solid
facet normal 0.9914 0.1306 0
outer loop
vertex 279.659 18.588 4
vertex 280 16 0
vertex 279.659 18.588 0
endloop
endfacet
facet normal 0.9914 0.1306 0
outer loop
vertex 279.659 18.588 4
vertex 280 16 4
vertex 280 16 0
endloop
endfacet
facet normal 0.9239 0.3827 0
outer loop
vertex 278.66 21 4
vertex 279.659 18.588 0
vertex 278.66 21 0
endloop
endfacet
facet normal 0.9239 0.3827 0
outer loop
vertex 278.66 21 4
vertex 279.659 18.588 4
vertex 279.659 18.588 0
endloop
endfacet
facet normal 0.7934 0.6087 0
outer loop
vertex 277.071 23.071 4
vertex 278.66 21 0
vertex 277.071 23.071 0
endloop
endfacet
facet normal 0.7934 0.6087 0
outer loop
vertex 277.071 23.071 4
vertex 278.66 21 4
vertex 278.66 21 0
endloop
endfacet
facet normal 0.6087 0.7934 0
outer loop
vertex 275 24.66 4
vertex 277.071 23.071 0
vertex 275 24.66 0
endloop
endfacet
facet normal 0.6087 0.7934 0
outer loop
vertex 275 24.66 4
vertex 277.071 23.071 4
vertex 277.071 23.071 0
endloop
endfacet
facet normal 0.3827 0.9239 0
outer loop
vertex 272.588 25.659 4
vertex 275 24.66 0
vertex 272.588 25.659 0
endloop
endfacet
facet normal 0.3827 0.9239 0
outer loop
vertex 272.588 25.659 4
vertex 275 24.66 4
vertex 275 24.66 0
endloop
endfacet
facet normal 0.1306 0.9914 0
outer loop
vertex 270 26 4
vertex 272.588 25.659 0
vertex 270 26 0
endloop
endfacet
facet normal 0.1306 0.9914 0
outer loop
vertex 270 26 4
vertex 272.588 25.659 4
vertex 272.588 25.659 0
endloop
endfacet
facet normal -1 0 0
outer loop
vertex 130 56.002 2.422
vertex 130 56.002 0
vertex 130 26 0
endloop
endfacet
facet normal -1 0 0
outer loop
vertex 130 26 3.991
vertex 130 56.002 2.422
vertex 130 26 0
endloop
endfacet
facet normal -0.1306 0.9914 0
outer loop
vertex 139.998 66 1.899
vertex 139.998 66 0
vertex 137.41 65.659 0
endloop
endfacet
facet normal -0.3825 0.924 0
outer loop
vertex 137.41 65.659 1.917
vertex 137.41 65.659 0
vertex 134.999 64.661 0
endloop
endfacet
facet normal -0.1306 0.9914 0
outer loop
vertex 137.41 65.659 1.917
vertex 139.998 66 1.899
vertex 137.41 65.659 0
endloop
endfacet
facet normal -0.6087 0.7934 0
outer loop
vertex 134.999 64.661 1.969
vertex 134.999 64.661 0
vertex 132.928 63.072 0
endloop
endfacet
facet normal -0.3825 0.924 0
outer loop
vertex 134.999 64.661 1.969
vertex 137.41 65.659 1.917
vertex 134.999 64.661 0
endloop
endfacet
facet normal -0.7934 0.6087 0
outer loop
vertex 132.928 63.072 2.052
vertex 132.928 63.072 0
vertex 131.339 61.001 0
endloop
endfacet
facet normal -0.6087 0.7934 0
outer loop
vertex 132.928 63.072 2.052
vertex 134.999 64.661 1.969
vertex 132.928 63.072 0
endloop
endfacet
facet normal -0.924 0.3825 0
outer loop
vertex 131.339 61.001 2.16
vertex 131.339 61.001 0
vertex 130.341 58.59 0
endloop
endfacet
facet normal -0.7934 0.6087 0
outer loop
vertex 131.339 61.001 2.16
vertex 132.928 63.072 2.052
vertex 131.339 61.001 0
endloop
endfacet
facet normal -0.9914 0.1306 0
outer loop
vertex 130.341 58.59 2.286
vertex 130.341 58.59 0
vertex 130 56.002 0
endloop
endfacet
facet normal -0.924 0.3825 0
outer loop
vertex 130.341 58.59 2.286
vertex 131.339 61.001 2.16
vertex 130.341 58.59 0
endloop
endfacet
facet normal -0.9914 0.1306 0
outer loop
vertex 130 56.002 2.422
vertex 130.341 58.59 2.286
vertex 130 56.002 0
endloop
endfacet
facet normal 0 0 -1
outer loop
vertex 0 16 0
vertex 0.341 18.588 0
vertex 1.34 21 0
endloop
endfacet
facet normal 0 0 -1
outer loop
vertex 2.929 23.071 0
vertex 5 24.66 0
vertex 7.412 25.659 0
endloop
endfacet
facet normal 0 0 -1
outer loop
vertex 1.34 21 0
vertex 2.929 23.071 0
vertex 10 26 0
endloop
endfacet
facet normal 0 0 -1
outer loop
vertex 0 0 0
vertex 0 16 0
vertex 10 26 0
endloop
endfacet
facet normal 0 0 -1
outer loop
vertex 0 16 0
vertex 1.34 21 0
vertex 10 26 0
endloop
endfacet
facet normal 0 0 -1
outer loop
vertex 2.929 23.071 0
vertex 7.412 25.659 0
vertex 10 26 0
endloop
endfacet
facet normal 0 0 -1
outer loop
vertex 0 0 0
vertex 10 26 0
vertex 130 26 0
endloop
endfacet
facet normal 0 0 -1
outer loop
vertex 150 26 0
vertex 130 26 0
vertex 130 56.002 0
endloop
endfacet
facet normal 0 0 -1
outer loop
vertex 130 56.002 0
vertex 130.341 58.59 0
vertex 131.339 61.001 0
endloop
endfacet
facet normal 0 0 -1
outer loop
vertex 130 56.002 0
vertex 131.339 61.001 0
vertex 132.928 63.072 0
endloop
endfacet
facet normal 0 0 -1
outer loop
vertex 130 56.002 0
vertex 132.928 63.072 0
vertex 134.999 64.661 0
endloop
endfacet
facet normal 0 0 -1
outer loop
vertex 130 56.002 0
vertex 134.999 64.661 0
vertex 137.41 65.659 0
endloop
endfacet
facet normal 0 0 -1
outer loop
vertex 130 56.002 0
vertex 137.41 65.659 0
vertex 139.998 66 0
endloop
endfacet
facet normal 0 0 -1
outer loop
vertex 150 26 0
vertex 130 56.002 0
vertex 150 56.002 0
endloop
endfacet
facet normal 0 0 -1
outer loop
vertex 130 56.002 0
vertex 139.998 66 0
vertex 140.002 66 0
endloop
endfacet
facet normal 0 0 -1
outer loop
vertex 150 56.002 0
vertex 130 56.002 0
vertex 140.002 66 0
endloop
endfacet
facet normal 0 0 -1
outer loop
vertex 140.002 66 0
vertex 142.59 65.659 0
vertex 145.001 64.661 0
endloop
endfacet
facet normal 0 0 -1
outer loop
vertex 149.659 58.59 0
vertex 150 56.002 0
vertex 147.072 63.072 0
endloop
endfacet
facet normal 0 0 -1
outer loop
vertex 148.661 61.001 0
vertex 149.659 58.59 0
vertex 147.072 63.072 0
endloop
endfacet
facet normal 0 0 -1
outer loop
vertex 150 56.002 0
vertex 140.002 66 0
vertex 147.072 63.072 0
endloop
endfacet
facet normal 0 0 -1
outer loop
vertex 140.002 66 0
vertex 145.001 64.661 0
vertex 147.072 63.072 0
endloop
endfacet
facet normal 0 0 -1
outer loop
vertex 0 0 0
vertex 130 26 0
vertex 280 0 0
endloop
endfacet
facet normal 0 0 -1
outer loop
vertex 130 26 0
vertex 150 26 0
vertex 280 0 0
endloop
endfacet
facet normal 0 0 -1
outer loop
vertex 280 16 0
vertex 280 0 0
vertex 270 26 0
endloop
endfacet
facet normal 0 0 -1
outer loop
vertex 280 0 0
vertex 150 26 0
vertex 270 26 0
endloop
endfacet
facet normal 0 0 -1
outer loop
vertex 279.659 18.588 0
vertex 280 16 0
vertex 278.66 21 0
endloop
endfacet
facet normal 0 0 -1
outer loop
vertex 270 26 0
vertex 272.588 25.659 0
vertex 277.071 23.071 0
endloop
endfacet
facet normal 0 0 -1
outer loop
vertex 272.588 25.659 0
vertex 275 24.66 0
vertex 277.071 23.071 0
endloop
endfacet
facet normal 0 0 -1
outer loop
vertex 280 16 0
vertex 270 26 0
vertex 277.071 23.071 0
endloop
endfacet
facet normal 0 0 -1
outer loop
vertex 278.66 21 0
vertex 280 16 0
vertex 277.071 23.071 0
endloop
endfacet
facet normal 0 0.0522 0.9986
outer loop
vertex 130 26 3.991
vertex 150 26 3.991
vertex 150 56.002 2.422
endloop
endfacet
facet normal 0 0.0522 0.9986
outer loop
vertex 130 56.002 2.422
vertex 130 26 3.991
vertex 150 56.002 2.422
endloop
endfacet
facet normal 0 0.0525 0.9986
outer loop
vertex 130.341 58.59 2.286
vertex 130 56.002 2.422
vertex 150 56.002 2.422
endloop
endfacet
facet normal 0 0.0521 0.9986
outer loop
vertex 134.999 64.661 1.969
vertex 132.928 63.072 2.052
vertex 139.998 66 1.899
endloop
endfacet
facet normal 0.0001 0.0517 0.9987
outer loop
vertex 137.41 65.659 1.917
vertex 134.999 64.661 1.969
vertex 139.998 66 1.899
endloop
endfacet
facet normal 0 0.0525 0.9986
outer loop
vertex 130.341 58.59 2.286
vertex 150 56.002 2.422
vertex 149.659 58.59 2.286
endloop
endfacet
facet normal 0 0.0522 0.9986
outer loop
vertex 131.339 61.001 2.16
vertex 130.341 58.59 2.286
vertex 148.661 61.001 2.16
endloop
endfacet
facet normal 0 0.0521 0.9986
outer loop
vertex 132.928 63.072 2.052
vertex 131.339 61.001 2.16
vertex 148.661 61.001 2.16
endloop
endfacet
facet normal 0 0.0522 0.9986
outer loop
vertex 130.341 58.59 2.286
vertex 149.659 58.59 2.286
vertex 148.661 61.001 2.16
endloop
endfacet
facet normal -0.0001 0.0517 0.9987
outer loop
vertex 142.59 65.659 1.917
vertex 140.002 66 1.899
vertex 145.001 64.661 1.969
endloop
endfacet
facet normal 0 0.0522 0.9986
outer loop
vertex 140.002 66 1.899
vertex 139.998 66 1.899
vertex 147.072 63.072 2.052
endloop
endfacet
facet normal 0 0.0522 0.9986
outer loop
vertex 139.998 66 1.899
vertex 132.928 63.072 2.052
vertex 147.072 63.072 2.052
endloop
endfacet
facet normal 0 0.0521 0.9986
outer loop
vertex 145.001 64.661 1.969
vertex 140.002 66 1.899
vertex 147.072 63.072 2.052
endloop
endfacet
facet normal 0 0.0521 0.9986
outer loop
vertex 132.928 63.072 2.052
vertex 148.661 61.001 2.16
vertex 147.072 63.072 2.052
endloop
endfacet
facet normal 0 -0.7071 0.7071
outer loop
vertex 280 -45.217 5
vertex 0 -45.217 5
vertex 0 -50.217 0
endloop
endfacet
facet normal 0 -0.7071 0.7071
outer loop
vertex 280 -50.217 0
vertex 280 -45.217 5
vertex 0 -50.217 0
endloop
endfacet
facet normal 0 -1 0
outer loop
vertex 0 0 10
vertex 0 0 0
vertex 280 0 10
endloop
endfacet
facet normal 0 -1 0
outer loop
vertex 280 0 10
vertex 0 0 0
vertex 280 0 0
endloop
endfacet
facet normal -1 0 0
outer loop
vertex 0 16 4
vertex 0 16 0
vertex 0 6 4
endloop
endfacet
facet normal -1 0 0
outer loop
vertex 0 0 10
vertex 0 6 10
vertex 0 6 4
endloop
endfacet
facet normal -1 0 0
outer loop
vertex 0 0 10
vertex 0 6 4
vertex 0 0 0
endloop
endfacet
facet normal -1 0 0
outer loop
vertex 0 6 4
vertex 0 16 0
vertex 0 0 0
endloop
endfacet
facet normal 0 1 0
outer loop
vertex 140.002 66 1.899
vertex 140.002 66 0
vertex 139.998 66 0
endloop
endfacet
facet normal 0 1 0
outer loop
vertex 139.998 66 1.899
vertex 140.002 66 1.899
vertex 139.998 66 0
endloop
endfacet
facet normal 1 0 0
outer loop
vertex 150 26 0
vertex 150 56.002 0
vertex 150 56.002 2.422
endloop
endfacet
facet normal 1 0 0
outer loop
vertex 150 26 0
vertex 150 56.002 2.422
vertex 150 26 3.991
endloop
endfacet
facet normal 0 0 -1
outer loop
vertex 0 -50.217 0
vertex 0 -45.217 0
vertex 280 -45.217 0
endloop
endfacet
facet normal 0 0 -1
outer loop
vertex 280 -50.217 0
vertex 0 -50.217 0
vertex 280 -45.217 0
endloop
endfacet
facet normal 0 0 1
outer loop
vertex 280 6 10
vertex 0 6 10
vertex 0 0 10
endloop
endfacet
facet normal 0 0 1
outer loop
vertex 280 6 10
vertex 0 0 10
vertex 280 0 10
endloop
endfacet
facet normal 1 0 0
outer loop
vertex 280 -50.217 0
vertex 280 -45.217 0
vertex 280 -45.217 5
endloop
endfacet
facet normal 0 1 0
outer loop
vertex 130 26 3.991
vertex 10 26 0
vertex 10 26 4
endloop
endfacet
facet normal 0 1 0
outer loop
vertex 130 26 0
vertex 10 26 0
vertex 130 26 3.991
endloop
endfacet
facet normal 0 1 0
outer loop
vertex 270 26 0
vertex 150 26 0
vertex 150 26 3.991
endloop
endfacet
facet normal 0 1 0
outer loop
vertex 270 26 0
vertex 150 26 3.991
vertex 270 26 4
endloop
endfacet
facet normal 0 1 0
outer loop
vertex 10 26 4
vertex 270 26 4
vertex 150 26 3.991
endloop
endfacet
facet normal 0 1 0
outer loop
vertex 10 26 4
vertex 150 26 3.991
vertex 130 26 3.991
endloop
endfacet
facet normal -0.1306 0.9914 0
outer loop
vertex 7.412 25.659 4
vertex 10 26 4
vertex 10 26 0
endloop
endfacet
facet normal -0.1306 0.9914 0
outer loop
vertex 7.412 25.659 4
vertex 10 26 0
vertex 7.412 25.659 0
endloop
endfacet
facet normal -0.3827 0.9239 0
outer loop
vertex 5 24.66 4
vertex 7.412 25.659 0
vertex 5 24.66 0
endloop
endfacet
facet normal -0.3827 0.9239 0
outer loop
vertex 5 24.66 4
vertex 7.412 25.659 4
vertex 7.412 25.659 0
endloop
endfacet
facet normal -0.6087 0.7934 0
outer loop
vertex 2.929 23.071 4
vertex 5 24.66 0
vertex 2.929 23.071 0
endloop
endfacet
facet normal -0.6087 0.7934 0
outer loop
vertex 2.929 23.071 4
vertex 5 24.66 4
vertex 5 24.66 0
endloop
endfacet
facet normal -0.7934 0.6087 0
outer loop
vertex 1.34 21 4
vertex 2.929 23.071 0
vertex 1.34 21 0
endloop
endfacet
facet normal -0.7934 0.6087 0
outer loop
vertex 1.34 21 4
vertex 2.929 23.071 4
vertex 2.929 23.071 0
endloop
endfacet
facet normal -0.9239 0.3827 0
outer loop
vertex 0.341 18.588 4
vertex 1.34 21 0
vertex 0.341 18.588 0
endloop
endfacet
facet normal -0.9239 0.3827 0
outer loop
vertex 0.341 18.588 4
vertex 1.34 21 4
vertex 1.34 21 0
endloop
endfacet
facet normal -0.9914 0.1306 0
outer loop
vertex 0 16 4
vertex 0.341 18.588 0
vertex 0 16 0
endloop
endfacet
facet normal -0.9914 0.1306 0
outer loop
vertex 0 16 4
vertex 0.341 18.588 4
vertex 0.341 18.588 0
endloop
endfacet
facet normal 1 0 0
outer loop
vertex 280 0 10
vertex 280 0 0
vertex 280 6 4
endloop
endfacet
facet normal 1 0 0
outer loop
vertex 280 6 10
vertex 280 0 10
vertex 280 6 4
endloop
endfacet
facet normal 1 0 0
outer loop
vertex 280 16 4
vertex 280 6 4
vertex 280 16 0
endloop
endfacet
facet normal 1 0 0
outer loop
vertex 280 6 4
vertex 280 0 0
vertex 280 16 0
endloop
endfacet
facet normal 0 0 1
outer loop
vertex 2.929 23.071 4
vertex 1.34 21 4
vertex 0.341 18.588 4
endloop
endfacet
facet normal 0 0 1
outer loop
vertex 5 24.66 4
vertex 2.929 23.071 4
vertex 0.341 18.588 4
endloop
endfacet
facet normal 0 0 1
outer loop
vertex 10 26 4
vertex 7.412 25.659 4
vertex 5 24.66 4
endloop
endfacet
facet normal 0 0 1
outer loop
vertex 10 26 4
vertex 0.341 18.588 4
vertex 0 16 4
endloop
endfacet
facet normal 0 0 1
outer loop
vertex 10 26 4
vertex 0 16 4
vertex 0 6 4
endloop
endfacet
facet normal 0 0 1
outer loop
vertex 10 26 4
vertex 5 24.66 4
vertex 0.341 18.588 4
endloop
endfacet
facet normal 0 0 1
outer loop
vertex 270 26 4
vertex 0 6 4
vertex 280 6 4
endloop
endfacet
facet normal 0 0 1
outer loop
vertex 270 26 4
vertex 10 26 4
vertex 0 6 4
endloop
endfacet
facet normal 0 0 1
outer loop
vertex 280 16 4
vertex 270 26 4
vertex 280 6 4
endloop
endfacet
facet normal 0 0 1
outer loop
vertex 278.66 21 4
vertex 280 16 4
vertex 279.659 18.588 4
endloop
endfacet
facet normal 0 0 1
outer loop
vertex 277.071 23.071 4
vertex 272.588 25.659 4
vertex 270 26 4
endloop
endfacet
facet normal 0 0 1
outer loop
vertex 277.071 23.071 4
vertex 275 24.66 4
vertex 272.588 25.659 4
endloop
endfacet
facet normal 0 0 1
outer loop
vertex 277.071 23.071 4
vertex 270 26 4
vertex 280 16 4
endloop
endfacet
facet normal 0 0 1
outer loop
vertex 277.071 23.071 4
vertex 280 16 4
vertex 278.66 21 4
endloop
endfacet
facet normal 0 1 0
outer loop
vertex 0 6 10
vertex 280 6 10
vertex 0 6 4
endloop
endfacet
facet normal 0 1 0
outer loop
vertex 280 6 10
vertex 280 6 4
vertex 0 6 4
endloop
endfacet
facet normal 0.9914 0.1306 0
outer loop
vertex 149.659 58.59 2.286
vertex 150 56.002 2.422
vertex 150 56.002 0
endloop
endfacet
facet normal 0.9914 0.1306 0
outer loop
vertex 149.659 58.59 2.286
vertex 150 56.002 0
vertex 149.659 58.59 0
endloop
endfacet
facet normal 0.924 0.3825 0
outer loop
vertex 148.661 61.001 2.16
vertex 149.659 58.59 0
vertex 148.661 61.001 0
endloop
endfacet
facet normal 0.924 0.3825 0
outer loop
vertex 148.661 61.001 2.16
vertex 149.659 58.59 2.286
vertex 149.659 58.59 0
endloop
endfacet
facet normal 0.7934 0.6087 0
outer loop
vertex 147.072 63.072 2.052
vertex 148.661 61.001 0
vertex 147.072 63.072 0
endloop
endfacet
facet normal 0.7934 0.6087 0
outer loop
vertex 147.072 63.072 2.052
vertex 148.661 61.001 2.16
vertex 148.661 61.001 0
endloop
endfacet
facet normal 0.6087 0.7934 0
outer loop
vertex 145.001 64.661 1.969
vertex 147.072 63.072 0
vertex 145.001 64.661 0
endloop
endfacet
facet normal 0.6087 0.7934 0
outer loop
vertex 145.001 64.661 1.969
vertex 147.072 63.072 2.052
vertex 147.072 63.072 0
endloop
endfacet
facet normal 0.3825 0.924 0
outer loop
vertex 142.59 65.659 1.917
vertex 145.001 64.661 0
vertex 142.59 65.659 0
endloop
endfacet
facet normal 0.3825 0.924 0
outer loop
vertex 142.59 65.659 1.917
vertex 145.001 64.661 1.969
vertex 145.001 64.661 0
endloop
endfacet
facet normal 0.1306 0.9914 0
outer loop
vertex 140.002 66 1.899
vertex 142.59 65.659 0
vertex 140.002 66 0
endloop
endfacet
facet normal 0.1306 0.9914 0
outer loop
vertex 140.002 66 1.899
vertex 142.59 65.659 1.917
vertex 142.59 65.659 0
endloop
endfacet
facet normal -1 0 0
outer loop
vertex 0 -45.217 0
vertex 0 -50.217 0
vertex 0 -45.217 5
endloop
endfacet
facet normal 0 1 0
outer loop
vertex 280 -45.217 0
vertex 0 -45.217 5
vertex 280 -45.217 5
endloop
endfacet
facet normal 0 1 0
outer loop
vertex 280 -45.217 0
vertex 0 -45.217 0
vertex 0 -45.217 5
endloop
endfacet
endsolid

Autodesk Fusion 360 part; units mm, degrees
sketch "Sketch1" plane through (0, 0, 0) normal (0, 0, 1) x (1, 0, 0)
  line L0 (0, 0) -> (280, 0)
  line L1 (280, 0) -> (280, 6)
  line L2 (280, 6) -> (0, 6)
  line L3 (0, 6) -> (0, 0)
  line L4 (280, 6) -> (0, 6)
  line L5 (0, 6) -> (0, 26)
  line L6 (0, 26) -> (280, 26)
  line L7 (280, 26) -> (280, 6)
  line L8 (140, 26) -> (140, 66) construction
  line L9 (140, 66) -> (150, 66)
  line L10 (150, 66) -> (150, 26)
  line L11 (150, 26) -> (140, 26)
  line L12 (140, 26) -> (140, 66)
  line L13 (140, 66) -> (130, 66)
  line L14 (130, 66) -> (130, 26)
  line L15 (130, 26) -> (140, 26)
  line L16 (140, 26) -> (140, 66)
  dimension "d1" = 280
  dimension "d2" = 6
  dimension "d9" = 20
  dimension "d10" = 280
  dimension "d11" = 40
  dimension "d12" = 10
  dimension "d13" = 10
extrude "Extrude3" add sketch "Sketch1" along normal blind 4 contours L2 L4 L5 L6 L7 L11 L15 makes body 1
extrude "Extrude1" add sketch "Sketch1" along normal blind 10 separate body contours L0 L1 L2 L3 L4 makes body 2
extrude "Extrude4" add sketch "Sketch1" along normal blind 4 contours L6 L12 L13 L14 L15 L16 | L6 L9 L10 L11 L12 L16 bodies 1
sketch "Sketch3" plane through (150, 0, 0) normal (1, 0, 0) x (0, 1, 0)
  line L0 (26, 0) -> (66, 0)
  line L1 (66, 0) -> (66, 4)
  line L2 (66, 4) -> (26, 4)
  line L3 (26, 4) -> (26, 0)
  line L4 (6.0067, 5.0364) -> (66, 1.8987)
extrude "Extrude5" cut sketch "Sketch3" against normal blind 20 contours L1 L2 L3 L4 bodies 1
sketch "Sketch4" plane through (0, 0, 0) normal (0, 0, 1) x (1, 0, 0)
  line L0 (0, -45.217) -> (280, -45.217)
  line L1 (280, -45.217) -> (280, -50.217)
  line L2 (280, -50.217) -> (0, -50.217)
  line L3 (0, -50.217) -> (0, -45.217)
  dimension "d20" = 280
  dimension "d21" = 5
extrude "Extrude6" add sketch "Sketch4" along normal blind 5 separate body makes body 3
sketch "Sketch5" plane through (280, 0, 0) normal (1, 0, 0) x (0, 1, 0)
  line L0 (-50.217, 0) -> (-45.217, 0)
  line L1 (-45.217, 0) -> (-45.217, 5)
  line L2 (-45.217, 5) -> (-50.217, 5)
  line L3 (-50.217, 5) -> (-50.217, 0)
  line L4 (-45.217, 5) -> (-50.217, 0)
extrude "Extrude7" cut sketch "Sketch5" against normal blind 280 contours L2 L3 L4 bodies 3
fillet "Fillet1" radius 10 2 edges at (130, 66, 0.9493) (150, 66, 0.9493) on bodies 1
fillet "Fillet2" radius 10 1 edges at (280, 26, 2) on bodies 1
fillet "Fillet3" radius 10 1 edges at (0, 26, 2) on bodies 1
combine "Combine1" operation add target body 1 tool bodies 2
